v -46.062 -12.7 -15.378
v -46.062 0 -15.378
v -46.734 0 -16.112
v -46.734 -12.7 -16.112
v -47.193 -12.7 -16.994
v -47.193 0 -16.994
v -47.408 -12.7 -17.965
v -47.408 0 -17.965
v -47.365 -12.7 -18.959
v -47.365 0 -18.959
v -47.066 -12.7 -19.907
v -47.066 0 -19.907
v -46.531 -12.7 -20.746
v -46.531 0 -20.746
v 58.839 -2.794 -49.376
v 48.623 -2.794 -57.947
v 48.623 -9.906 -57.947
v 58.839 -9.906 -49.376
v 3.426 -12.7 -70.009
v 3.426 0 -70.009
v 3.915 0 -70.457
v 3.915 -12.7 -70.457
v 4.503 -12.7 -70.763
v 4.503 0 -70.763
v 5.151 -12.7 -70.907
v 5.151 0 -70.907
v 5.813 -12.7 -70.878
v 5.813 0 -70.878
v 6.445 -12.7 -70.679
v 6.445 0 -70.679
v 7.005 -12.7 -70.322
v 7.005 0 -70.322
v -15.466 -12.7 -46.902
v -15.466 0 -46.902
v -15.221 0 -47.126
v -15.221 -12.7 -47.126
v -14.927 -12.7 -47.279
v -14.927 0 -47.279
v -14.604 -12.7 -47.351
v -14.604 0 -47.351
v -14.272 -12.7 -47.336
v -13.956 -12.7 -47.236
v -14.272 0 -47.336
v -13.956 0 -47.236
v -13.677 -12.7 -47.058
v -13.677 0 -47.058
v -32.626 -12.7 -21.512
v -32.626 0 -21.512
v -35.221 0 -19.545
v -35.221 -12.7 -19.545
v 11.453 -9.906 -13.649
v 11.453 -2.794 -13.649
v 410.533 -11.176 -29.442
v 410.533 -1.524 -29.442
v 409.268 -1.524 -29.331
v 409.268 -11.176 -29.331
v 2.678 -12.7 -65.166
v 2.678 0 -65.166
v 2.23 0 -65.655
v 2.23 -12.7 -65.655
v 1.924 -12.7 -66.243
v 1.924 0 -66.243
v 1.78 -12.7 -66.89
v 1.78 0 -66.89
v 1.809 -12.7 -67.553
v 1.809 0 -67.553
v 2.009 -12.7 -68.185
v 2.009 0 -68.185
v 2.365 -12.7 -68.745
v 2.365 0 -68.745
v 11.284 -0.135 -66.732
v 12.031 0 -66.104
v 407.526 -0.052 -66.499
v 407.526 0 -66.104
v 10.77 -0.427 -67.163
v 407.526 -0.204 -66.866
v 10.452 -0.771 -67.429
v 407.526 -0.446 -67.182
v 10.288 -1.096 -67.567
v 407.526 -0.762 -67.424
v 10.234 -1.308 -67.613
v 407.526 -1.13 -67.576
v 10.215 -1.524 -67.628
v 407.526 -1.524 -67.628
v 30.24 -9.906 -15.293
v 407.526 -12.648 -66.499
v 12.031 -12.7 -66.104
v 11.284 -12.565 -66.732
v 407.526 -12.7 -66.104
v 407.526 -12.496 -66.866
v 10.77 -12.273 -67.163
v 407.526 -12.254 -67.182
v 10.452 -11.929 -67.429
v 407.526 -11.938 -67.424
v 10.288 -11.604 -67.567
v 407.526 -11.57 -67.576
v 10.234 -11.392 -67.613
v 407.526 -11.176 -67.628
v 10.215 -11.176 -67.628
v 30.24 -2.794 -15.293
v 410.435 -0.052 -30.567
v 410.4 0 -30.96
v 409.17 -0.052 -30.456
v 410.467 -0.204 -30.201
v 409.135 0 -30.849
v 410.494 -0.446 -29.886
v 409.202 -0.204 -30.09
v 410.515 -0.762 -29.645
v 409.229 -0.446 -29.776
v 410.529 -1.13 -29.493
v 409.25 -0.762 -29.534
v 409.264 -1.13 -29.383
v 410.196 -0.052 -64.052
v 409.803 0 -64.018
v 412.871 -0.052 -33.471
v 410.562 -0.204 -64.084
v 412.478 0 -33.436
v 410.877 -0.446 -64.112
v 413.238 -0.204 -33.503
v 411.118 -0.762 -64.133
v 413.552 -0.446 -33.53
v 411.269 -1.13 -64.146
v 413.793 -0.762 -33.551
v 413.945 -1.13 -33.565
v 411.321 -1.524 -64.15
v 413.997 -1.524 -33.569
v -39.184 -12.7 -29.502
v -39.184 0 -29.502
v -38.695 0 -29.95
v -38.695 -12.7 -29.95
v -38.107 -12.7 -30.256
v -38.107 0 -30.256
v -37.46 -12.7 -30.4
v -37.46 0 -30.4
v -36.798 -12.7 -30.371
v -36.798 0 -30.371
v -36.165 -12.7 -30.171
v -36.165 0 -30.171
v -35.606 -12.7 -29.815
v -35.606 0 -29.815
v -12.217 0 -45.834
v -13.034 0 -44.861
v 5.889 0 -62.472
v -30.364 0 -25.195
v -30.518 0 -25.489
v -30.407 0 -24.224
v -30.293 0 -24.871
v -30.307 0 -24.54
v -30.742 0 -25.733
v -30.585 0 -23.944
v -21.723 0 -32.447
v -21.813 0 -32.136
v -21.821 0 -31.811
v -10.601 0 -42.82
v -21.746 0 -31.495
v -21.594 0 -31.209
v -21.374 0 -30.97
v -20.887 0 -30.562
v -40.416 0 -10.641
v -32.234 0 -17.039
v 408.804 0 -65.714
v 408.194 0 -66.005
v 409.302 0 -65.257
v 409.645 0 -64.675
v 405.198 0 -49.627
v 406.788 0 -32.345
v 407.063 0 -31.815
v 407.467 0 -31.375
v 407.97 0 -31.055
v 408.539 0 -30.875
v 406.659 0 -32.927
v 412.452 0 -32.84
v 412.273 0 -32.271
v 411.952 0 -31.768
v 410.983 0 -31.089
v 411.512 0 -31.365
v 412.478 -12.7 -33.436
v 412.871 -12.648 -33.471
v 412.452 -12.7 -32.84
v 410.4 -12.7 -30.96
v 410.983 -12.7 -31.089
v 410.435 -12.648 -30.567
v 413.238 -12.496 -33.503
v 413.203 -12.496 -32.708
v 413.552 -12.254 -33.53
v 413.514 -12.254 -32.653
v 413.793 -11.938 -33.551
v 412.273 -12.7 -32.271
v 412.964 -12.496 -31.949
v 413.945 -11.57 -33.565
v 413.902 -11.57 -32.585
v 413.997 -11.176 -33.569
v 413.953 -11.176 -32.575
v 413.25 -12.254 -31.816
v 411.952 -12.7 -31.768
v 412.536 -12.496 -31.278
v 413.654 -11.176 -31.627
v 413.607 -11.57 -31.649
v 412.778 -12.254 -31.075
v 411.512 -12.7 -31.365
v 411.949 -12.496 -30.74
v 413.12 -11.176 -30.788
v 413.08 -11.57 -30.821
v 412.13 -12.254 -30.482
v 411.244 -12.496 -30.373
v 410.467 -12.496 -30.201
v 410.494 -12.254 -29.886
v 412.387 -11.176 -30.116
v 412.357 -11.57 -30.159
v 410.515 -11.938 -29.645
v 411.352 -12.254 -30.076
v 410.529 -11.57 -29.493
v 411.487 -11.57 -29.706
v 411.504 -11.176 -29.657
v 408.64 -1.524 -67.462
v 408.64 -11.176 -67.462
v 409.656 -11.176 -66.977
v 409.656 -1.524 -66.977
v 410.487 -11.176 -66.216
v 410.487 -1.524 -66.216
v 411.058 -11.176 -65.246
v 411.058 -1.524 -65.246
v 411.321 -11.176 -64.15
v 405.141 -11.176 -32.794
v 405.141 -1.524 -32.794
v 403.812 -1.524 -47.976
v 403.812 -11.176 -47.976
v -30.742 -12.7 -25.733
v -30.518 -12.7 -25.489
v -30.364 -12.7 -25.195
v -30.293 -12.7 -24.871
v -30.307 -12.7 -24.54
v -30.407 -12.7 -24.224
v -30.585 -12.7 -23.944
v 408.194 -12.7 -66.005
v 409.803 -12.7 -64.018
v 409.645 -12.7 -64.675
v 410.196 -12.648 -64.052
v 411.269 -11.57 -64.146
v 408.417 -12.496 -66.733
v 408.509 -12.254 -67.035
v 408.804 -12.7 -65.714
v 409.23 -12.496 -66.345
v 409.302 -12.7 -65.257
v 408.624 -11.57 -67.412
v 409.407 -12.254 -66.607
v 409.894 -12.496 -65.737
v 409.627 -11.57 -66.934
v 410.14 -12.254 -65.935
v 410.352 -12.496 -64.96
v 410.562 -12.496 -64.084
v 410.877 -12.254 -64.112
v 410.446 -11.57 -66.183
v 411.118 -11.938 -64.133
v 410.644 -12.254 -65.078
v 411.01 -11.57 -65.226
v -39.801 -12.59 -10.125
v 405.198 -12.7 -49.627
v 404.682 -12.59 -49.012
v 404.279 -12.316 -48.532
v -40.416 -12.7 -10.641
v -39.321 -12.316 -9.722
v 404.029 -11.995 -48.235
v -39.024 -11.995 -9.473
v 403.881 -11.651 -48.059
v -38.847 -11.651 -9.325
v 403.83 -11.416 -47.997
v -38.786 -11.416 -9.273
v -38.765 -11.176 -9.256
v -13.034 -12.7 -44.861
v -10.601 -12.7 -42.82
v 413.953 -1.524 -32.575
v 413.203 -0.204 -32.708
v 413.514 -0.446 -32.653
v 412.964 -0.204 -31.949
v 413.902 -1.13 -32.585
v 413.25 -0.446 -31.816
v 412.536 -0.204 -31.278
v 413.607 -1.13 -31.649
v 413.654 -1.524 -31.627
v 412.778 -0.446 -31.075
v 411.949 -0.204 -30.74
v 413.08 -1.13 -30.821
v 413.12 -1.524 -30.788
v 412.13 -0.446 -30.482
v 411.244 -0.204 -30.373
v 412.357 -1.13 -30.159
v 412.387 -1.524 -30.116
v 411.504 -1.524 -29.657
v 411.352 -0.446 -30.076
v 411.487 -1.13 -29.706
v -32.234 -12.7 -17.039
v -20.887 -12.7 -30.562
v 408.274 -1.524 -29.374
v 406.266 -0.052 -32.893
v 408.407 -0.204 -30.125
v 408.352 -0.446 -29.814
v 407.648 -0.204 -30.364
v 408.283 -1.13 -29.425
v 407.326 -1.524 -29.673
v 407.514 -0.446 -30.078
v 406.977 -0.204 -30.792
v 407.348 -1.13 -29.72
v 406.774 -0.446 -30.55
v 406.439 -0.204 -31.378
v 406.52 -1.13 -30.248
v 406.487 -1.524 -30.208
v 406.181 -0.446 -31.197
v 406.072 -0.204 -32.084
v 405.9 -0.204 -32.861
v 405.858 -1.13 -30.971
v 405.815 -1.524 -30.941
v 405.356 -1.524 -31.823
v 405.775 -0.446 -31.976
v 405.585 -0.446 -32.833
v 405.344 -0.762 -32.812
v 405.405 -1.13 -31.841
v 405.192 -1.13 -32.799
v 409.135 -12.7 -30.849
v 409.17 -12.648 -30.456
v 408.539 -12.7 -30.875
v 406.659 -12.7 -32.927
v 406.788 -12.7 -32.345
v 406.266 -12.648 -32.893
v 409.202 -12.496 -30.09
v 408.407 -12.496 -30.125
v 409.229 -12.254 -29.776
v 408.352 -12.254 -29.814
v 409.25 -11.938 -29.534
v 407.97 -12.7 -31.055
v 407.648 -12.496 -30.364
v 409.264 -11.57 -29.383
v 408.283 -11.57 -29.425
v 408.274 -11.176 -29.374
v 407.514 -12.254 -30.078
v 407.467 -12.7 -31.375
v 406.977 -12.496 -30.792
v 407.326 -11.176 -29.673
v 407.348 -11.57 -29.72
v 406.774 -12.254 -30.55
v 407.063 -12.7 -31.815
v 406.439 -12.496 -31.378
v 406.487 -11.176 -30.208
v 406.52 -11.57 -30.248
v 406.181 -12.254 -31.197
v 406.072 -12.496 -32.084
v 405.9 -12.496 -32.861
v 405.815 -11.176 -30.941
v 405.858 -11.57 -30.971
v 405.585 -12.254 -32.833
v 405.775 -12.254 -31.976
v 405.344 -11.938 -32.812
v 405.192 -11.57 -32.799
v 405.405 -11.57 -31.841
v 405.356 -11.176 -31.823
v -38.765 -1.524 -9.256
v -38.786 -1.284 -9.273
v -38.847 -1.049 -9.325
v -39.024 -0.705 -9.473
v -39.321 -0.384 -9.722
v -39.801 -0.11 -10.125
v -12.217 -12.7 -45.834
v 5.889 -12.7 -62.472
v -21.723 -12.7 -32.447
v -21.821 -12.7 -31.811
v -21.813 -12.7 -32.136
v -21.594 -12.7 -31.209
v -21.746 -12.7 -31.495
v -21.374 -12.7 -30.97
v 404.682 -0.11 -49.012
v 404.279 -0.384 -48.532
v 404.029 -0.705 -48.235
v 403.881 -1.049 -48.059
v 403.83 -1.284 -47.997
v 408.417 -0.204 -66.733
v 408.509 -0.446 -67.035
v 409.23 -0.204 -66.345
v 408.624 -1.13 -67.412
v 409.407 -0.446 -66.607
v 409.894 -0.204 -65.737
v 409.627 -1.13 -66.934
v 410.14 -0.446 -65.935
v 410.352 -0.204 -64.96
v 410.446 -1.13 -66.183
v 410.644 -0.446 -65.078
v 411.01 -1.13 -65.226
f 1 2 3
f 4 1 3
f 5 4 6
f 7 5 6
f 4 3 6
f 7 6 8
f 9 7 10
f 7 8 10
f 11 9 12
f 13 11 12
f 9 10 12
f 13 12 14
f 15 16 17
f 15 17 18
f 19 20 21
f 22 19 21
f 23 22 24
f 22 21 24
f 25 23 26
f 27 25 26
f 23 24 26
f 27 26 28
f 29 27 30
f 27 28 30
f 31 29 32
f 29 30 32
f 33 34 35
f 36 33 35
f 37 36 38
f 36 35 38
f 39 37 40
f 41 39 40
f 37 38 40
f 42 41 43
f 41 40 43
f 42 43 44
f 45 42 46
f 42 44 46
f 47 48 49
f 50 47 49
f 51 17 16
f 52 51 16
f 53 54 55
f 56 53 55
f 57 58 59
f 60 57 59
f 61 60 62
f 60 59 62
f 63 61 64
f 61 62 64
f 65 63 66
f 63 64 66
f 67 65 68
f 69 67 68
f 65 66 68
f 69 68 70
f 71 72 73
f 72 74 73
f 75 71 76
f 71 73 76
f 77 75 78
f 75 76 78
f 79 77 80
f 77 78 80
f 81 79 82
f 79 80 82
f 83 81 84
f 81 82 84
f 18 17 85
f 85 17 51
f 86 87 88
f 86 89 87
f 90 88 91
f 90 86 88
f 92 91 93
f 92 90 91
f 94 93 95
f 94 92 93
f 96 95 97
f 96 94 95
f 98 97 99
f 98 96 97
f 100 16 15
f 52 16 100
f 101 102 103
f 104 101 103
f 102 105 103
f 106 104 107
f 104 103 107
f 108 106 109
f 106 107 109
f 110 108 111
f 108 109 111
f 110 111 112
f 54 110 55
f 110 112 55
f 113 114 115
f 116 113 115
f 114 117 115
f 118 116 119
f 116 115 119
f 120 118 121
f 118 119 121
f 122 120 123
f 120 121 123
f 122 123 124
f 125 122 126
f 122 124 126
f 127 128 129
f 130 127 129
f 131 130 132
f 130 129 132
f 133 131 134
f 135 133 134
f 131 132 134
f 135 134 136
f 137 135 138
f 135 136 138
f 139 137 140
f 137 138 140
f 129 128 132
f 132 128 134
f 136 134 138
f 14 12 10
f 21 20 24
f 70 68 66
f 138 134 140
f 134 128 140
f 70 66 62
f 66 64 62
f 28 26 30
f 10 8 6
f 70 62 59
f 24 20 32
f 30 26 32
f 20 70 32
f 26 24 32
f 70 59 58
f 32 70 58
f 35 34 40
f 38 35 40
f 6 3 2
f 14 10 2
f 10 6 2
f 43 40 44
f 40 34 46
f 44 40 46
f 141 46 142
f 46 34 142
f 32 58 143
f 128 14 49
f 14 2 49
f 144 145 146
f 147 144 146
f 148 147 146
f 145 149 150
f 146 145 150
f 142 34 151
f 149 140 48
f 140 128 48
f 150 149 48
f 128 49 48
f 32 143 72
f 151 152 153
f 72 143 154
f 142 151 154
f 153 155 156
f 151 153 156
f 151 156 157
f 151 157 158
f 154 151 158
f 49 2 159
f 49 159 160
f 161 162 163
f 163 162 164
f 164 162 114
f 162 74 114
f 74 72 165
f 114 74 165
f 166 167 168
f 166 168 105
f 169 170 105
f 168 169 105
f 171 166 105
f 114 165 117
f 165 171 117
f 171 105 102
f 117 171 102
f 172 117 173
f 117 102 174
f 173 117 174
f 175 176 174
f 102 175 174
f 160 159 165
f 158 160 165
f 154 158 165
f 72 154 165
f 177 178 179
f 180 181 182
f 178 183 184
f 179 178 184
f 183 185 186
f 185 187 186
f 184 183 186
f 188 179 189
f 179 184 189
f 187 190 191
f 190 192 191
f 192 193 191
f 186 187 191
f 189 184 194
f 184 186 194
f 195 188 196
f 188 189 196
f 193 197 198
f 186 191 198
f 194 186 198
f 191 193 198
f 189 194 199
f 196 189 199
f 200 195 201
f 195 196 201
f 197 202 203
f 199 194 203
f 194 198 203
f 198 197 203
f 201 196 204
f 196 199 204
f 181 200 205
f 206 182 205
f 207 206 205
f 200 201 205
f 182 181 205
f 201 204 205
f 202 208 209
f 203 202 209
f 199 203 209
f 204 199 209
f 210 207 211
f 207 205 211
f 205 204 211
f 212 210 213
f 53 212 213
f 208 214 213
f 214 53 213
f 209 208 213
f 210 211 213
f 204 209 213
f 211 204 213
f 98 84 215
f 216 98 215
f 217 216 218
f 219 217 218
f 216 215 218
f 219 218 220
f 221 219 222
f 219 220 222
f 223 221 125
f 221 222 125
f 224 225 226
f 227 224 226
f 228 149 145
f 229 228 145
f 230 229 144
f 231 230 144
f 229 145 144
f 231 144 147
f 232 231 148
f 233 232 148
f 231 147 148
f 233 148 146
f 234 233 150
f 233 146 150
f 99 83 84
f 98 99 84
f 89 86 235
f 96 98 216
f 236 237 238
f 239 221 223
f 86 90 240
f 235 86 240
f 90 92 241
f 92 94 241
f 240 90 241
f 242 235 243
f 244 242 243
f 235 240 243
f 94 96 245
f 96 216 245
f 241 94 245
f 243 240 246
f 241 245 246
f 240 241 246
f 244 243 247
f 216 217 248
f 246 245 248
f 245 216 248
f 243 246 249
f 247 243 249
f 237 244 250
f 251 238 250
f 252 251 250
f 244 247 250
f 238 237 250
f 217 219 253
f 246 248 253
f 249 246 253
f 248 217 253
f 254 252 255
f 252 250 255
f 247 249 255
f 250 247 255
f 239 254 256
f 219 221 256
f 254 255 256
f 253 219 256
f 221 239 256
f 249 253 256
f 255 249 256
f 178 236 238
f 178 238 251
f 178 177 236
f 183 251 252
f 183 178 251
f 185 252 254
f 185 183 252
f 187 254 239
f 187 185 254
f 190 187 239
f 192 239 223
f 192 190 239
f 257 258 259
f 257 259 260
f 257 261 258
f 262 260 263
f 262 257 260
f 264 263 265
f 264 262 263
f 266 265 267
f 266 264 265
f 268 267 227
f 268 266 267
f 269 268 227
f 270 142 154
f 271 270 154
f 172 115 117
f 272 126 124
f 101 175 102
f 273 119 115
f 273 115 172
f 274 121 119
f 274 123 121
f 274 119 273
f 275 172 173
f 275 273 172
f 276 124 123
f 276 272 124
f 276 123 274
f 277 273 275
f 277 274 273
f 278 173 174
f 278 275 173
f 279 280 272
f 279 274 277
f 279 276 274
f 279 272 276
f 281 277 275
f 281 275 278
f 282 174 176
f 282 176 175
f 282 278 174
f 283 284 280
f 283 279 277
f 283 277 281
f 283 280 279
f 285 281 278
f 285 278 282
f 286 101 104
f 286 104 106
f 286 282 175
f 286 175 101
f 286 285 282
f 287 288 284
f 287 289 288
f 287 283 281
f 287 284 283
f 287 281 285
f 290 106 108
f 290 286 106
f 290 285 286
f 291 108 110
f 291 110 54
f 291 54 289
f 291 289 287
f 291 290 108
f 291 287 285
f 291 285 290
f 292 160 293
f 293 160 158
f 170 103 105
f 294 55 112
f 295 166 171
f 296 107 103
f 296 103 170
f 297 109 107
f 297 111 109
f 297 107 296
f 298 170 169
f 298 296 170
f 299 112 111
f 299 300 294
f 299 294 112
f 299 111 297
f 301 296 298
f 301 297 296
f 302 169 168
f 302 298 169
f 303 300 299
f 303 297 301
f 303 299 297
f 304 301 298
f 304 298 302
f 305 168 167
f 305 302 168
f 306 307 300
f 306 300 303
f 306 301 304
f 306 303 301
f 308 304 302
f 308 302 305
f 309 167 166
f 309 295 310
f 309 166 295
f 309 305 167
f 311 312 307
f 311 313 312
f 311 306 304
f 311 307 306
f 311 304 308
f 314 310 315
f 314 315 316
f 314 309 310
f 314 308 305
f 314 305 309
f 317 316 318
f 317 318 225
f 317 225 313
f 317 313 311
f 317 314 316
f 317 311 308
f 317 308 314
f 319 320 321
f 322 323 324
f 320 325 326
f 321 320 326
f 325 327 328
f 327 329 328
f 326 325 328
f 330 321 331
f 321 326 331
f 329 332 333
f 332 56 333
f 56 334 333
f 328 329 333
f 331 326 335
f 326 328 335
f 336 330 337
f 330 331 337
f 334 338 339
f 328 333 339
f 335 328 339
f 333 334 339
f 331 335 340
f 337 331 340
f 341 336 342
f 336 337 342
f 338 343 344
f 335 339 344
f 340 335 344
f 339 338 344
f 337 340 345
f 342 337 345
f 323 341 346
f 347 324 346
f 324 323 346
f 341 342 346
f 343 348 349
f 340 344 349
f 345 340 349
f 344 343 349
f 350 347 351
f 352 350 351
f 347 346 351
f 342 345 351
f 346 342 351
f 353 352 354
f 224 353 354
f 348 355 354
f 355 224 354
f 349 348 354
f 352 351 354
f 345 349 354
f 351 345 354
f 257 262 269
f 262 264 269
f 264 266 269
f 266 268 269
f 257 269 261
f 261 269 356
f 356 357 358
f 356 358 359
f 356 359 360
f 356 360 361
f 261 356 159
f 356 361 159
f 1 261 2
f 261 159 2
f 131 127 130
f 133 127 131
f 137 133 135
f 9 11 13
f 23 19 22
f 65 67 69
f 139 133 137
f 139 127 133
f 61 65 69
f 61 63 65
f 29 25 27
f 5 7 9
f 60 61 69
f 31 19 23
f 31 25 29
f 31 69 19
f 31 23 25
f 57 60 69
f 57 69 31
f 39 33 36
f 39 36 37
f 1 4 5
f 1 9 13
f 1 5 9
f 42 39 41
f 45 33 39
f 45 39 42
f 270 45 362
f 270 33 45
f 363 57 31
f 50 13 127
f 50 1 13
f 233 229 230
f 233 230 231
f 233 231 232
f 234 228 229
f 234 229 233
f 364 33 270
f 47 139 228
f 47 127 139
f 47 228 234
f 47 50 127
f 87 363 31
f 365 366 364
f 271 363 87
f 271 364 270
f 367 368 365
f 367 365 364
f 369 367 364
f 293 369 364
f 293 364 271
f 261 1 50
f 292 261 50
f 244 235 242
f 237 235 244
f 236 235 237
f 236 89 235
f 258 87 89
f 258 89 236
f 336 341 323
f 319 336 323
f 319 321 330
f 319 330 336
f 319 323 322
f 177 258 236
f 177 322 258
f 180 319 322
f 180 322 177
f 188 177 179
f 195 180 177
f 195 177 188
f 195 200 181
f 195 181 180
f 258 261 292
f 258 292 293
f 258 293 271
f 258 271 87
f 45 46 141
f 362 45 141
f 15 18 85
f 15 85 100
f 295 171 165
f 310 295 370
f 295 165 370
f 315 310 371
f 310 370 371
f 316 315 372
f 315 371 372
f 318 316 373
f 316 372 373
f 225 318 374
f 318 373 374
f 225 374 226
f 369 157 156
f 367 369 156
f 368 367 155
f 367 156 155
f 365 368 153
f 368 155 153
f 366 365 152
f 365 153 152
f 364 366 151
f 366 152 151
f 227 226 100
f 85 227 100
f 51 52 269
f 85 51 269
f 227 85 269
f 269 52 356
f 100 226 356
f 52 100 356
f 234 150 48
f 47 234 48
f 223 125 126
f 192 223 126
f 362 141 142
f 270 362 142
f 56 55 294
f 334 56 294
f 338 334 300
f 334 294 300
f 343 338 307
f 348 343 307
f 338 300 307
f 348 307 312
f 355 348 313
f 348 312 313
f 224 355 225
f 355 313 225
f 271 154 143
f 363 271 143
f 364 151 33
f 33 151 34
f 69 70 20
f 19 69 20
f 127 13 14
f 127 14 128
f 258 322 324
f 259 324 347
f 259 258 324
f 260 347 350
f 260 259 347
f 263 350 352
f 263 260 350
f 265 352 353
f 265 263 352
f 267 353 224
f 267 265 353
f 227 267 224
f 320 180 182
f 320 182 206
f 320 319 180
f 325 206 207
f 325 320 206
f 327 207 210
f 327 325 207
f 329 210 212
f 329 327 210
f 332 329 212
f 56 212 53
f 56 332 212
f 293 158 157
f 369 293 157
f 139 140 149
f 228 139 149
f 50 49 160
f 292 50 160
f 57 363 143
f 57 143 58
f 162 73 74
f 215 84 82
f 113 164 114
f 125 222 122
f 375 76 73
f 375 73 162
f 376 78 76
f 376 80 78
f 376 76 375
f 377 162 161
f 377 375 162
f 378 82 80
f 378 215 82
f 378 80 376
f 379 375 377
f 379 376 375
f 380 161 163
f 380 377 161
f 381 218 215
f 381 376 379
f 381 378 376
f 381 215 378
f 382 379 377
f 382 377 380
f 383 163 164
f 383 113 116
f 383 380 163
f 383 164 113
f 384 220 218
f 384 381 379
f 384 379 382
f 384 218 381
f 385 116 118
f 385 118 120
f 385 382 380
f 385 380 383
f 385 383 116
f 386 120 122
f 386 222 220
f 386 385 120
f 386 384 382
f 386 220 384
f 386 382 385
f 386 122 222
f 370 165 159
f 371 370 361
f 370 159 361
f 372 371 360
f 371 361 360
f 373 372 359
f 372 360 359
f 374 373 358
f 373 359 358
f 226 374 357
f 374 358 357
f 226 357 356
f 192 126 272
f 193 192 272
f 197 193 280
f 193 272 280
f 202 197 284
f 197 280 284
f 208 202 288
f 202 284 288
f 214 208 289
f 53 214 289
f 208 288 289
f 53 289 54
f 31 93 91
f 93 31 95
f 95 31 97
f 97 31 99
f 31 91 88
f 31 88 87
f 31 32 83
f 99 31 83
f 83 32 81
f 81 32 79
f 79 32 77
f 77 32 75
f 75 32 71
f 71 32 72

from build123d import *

# Parameters (mm, degrees)
F1_DEPTH = 12.7
F2_W     = 13.335
F2_H     = 7.112
F3_DEPTH = 93.472
F5_R     = 1.524


# Not quite as in the source:
# - two fillets or chamfers of one size are made in one step


with BuildPart() as f1:
    # F0 (on Front) → F1 (new body)
    with BuildSketch(Plane.XZ):
        with BuildLine():
            ThreePointArc((-46.0617865298, -15.3783926414), (-47.4082675367, -17.9649585898), (-46.5313950652, -20.7460427626))
            Line((-46.5313950652, -20.7460427626), (-39.1843326865, -29.5019307475))
            ThreePointArc((-39.1843326865, -29.5019307475), (-37.4599553875, -30.399584752), (-35.6058992724, -29.8150031044))
            Line((-35.6058992724, -29.8150031044), (-30.7415170586, -25.7333017829))
            ThreePointArc((-30.7415170586, -25.7333017829), (-30.2926900563, -24.8711131334), (-30.5849808801, -23.9440850758))
            Line((-30.5849808801, -23.9440850758), (-32.6258315409, -21.5118939689))
            Line((-32.6258315409, -21.5118939689), (-35.2214163384, -19.5451800716))
            Line((-35.2214163384, -19.5451800716), (-32.2344910947, -17.0388522013))
            Line((-32.2344910947, -17.0388522013), (-20.8873614209, -30.5618347556))
            Line((-20.8873614209, -30.5618347556), (-21.3737996423, -30.9700048878))
            ThreePointArc((-21.3737996423, -30.9700048878), (-21.7934146066, -31.6507945747), (-21.722945379, -32.4474032641))
            Line((-21.722945379, -32.4474032641), (-15.4658563045, -46.9017792559))
            ThreePointArc((-15.4658563045, -46.9017792559), (-14.603667655, -47.3506062582), (-13.6766395974, -47.0583154344))
            Line((-13.6766395974, -47.0583154344), (-12.2173249333, -45.8338050379))
            Line((-12.2173249333, -45.8338050379), (-13.0336651976, -44.8609285952))
            Line((-13.0336651976, -44.8609285952), (-10.6014740907, -42.8200779344))
            Line((-10.6014740907, -42.8200779344), (5.8885992482, -62.4721820782))
            Line((5.8885992482, -62.4721820782), (2.6781069871, -65.1661049504))
            ThreePointArc((2.6781069871, -65.1661049504), (1.7804529825, -66.8904822493), (2.3650346302, -68.7445383645))
            Line((2.3650346302, -68.7445383645), (3.4262769738, -70.0092777401))
            ThreePointArc((3.4262769738, -70.0092777401), (5.1506542727, -70.9069317447), (7.0047103879, -70.322350097))
            Line((7.0047103879, -70.322350097), (10.215202649, -67.6284272248))
            Line((10.215202649, -67.6284272248), (407.5256729651, -67.6284272248))
            ThreePointArc((407.5256729651, -67.6284272248), (410.0996716561, -66.6274538781), (411.3211747648, -64.1504906047))
            Line((411.3211747648, -64.1504906047), (413.9966944617, -33.5691605326))
            ThreePointArc((413.9966944617, -33.5691605326), (413.1198219902, -30.7880763598), (410.5332560418, -29.441595353))
            Line((410.5332560418, -29.441595353), (409.2680887752, -29.3309075597))
            ThreePointArc((409.2680887752, -29.3309075597), (406.4870046025, -30.2077800311), (405.1405235956, -32.7943459795))
            Line((405.1405235956, -32.7943459795), (403.8122700762, -47.9763531785))
            Line((403.8122700762, -47.9763531785), (-38.7652132091, -9.2558406592))
            Line((-38.7652132091, -9.2558406592), (-46.0617865298, -15.3783926414))
        make_face()
    extrude(amount=F1_DEPTH)

    # F2 (on face) → F3 (cut)
    with BuildSketch(Plane(origin=(-11.4592404683, 0, 13.6565909966), x_dir=(0.7660444431, 0, 0.6427876097), z_dir=(-0.6427876097, 0, 0.7660444431))):
        with Locations((6.6675, -6.35)):
            Rectangle(F2_W, F2_H)
    extrude(amount=-F3_DEPTH, mode=Mode.SUBTRACT)

    # F5
    f5_edges = [f1.edges().sort_by_distance(p)[0] for p in [
        (182.523528, 0, -28.616097),
        (404.476397, 0, -40.38535),
        (208.870438, 0, -67.628427),
        (409.900672, 0, -29.386251),
        (409.900672, -12.7, -29.386251),
        (413.119822, 0, -30.788076),
        (413.119822, -12.7, -30.788076),
        (406.487005, 0, -30.20778),
        (406.487005, -12.7, -30.20778),
        (410.099672, 0, -66.627454),
        (412.658935, 0, -48.859826),
        (404.476397, -12.7, -40.38535),
        (182.523528, -12.7, -28.616097),
        (208.870438, -12.7, -67.628427),
        (410.099672, -12.7, -66.627454),
        (412.658935, -12.7, -48.859826),
    ]]
    fillet(f5_edges, radius=F5_R)


solid = f1.part
